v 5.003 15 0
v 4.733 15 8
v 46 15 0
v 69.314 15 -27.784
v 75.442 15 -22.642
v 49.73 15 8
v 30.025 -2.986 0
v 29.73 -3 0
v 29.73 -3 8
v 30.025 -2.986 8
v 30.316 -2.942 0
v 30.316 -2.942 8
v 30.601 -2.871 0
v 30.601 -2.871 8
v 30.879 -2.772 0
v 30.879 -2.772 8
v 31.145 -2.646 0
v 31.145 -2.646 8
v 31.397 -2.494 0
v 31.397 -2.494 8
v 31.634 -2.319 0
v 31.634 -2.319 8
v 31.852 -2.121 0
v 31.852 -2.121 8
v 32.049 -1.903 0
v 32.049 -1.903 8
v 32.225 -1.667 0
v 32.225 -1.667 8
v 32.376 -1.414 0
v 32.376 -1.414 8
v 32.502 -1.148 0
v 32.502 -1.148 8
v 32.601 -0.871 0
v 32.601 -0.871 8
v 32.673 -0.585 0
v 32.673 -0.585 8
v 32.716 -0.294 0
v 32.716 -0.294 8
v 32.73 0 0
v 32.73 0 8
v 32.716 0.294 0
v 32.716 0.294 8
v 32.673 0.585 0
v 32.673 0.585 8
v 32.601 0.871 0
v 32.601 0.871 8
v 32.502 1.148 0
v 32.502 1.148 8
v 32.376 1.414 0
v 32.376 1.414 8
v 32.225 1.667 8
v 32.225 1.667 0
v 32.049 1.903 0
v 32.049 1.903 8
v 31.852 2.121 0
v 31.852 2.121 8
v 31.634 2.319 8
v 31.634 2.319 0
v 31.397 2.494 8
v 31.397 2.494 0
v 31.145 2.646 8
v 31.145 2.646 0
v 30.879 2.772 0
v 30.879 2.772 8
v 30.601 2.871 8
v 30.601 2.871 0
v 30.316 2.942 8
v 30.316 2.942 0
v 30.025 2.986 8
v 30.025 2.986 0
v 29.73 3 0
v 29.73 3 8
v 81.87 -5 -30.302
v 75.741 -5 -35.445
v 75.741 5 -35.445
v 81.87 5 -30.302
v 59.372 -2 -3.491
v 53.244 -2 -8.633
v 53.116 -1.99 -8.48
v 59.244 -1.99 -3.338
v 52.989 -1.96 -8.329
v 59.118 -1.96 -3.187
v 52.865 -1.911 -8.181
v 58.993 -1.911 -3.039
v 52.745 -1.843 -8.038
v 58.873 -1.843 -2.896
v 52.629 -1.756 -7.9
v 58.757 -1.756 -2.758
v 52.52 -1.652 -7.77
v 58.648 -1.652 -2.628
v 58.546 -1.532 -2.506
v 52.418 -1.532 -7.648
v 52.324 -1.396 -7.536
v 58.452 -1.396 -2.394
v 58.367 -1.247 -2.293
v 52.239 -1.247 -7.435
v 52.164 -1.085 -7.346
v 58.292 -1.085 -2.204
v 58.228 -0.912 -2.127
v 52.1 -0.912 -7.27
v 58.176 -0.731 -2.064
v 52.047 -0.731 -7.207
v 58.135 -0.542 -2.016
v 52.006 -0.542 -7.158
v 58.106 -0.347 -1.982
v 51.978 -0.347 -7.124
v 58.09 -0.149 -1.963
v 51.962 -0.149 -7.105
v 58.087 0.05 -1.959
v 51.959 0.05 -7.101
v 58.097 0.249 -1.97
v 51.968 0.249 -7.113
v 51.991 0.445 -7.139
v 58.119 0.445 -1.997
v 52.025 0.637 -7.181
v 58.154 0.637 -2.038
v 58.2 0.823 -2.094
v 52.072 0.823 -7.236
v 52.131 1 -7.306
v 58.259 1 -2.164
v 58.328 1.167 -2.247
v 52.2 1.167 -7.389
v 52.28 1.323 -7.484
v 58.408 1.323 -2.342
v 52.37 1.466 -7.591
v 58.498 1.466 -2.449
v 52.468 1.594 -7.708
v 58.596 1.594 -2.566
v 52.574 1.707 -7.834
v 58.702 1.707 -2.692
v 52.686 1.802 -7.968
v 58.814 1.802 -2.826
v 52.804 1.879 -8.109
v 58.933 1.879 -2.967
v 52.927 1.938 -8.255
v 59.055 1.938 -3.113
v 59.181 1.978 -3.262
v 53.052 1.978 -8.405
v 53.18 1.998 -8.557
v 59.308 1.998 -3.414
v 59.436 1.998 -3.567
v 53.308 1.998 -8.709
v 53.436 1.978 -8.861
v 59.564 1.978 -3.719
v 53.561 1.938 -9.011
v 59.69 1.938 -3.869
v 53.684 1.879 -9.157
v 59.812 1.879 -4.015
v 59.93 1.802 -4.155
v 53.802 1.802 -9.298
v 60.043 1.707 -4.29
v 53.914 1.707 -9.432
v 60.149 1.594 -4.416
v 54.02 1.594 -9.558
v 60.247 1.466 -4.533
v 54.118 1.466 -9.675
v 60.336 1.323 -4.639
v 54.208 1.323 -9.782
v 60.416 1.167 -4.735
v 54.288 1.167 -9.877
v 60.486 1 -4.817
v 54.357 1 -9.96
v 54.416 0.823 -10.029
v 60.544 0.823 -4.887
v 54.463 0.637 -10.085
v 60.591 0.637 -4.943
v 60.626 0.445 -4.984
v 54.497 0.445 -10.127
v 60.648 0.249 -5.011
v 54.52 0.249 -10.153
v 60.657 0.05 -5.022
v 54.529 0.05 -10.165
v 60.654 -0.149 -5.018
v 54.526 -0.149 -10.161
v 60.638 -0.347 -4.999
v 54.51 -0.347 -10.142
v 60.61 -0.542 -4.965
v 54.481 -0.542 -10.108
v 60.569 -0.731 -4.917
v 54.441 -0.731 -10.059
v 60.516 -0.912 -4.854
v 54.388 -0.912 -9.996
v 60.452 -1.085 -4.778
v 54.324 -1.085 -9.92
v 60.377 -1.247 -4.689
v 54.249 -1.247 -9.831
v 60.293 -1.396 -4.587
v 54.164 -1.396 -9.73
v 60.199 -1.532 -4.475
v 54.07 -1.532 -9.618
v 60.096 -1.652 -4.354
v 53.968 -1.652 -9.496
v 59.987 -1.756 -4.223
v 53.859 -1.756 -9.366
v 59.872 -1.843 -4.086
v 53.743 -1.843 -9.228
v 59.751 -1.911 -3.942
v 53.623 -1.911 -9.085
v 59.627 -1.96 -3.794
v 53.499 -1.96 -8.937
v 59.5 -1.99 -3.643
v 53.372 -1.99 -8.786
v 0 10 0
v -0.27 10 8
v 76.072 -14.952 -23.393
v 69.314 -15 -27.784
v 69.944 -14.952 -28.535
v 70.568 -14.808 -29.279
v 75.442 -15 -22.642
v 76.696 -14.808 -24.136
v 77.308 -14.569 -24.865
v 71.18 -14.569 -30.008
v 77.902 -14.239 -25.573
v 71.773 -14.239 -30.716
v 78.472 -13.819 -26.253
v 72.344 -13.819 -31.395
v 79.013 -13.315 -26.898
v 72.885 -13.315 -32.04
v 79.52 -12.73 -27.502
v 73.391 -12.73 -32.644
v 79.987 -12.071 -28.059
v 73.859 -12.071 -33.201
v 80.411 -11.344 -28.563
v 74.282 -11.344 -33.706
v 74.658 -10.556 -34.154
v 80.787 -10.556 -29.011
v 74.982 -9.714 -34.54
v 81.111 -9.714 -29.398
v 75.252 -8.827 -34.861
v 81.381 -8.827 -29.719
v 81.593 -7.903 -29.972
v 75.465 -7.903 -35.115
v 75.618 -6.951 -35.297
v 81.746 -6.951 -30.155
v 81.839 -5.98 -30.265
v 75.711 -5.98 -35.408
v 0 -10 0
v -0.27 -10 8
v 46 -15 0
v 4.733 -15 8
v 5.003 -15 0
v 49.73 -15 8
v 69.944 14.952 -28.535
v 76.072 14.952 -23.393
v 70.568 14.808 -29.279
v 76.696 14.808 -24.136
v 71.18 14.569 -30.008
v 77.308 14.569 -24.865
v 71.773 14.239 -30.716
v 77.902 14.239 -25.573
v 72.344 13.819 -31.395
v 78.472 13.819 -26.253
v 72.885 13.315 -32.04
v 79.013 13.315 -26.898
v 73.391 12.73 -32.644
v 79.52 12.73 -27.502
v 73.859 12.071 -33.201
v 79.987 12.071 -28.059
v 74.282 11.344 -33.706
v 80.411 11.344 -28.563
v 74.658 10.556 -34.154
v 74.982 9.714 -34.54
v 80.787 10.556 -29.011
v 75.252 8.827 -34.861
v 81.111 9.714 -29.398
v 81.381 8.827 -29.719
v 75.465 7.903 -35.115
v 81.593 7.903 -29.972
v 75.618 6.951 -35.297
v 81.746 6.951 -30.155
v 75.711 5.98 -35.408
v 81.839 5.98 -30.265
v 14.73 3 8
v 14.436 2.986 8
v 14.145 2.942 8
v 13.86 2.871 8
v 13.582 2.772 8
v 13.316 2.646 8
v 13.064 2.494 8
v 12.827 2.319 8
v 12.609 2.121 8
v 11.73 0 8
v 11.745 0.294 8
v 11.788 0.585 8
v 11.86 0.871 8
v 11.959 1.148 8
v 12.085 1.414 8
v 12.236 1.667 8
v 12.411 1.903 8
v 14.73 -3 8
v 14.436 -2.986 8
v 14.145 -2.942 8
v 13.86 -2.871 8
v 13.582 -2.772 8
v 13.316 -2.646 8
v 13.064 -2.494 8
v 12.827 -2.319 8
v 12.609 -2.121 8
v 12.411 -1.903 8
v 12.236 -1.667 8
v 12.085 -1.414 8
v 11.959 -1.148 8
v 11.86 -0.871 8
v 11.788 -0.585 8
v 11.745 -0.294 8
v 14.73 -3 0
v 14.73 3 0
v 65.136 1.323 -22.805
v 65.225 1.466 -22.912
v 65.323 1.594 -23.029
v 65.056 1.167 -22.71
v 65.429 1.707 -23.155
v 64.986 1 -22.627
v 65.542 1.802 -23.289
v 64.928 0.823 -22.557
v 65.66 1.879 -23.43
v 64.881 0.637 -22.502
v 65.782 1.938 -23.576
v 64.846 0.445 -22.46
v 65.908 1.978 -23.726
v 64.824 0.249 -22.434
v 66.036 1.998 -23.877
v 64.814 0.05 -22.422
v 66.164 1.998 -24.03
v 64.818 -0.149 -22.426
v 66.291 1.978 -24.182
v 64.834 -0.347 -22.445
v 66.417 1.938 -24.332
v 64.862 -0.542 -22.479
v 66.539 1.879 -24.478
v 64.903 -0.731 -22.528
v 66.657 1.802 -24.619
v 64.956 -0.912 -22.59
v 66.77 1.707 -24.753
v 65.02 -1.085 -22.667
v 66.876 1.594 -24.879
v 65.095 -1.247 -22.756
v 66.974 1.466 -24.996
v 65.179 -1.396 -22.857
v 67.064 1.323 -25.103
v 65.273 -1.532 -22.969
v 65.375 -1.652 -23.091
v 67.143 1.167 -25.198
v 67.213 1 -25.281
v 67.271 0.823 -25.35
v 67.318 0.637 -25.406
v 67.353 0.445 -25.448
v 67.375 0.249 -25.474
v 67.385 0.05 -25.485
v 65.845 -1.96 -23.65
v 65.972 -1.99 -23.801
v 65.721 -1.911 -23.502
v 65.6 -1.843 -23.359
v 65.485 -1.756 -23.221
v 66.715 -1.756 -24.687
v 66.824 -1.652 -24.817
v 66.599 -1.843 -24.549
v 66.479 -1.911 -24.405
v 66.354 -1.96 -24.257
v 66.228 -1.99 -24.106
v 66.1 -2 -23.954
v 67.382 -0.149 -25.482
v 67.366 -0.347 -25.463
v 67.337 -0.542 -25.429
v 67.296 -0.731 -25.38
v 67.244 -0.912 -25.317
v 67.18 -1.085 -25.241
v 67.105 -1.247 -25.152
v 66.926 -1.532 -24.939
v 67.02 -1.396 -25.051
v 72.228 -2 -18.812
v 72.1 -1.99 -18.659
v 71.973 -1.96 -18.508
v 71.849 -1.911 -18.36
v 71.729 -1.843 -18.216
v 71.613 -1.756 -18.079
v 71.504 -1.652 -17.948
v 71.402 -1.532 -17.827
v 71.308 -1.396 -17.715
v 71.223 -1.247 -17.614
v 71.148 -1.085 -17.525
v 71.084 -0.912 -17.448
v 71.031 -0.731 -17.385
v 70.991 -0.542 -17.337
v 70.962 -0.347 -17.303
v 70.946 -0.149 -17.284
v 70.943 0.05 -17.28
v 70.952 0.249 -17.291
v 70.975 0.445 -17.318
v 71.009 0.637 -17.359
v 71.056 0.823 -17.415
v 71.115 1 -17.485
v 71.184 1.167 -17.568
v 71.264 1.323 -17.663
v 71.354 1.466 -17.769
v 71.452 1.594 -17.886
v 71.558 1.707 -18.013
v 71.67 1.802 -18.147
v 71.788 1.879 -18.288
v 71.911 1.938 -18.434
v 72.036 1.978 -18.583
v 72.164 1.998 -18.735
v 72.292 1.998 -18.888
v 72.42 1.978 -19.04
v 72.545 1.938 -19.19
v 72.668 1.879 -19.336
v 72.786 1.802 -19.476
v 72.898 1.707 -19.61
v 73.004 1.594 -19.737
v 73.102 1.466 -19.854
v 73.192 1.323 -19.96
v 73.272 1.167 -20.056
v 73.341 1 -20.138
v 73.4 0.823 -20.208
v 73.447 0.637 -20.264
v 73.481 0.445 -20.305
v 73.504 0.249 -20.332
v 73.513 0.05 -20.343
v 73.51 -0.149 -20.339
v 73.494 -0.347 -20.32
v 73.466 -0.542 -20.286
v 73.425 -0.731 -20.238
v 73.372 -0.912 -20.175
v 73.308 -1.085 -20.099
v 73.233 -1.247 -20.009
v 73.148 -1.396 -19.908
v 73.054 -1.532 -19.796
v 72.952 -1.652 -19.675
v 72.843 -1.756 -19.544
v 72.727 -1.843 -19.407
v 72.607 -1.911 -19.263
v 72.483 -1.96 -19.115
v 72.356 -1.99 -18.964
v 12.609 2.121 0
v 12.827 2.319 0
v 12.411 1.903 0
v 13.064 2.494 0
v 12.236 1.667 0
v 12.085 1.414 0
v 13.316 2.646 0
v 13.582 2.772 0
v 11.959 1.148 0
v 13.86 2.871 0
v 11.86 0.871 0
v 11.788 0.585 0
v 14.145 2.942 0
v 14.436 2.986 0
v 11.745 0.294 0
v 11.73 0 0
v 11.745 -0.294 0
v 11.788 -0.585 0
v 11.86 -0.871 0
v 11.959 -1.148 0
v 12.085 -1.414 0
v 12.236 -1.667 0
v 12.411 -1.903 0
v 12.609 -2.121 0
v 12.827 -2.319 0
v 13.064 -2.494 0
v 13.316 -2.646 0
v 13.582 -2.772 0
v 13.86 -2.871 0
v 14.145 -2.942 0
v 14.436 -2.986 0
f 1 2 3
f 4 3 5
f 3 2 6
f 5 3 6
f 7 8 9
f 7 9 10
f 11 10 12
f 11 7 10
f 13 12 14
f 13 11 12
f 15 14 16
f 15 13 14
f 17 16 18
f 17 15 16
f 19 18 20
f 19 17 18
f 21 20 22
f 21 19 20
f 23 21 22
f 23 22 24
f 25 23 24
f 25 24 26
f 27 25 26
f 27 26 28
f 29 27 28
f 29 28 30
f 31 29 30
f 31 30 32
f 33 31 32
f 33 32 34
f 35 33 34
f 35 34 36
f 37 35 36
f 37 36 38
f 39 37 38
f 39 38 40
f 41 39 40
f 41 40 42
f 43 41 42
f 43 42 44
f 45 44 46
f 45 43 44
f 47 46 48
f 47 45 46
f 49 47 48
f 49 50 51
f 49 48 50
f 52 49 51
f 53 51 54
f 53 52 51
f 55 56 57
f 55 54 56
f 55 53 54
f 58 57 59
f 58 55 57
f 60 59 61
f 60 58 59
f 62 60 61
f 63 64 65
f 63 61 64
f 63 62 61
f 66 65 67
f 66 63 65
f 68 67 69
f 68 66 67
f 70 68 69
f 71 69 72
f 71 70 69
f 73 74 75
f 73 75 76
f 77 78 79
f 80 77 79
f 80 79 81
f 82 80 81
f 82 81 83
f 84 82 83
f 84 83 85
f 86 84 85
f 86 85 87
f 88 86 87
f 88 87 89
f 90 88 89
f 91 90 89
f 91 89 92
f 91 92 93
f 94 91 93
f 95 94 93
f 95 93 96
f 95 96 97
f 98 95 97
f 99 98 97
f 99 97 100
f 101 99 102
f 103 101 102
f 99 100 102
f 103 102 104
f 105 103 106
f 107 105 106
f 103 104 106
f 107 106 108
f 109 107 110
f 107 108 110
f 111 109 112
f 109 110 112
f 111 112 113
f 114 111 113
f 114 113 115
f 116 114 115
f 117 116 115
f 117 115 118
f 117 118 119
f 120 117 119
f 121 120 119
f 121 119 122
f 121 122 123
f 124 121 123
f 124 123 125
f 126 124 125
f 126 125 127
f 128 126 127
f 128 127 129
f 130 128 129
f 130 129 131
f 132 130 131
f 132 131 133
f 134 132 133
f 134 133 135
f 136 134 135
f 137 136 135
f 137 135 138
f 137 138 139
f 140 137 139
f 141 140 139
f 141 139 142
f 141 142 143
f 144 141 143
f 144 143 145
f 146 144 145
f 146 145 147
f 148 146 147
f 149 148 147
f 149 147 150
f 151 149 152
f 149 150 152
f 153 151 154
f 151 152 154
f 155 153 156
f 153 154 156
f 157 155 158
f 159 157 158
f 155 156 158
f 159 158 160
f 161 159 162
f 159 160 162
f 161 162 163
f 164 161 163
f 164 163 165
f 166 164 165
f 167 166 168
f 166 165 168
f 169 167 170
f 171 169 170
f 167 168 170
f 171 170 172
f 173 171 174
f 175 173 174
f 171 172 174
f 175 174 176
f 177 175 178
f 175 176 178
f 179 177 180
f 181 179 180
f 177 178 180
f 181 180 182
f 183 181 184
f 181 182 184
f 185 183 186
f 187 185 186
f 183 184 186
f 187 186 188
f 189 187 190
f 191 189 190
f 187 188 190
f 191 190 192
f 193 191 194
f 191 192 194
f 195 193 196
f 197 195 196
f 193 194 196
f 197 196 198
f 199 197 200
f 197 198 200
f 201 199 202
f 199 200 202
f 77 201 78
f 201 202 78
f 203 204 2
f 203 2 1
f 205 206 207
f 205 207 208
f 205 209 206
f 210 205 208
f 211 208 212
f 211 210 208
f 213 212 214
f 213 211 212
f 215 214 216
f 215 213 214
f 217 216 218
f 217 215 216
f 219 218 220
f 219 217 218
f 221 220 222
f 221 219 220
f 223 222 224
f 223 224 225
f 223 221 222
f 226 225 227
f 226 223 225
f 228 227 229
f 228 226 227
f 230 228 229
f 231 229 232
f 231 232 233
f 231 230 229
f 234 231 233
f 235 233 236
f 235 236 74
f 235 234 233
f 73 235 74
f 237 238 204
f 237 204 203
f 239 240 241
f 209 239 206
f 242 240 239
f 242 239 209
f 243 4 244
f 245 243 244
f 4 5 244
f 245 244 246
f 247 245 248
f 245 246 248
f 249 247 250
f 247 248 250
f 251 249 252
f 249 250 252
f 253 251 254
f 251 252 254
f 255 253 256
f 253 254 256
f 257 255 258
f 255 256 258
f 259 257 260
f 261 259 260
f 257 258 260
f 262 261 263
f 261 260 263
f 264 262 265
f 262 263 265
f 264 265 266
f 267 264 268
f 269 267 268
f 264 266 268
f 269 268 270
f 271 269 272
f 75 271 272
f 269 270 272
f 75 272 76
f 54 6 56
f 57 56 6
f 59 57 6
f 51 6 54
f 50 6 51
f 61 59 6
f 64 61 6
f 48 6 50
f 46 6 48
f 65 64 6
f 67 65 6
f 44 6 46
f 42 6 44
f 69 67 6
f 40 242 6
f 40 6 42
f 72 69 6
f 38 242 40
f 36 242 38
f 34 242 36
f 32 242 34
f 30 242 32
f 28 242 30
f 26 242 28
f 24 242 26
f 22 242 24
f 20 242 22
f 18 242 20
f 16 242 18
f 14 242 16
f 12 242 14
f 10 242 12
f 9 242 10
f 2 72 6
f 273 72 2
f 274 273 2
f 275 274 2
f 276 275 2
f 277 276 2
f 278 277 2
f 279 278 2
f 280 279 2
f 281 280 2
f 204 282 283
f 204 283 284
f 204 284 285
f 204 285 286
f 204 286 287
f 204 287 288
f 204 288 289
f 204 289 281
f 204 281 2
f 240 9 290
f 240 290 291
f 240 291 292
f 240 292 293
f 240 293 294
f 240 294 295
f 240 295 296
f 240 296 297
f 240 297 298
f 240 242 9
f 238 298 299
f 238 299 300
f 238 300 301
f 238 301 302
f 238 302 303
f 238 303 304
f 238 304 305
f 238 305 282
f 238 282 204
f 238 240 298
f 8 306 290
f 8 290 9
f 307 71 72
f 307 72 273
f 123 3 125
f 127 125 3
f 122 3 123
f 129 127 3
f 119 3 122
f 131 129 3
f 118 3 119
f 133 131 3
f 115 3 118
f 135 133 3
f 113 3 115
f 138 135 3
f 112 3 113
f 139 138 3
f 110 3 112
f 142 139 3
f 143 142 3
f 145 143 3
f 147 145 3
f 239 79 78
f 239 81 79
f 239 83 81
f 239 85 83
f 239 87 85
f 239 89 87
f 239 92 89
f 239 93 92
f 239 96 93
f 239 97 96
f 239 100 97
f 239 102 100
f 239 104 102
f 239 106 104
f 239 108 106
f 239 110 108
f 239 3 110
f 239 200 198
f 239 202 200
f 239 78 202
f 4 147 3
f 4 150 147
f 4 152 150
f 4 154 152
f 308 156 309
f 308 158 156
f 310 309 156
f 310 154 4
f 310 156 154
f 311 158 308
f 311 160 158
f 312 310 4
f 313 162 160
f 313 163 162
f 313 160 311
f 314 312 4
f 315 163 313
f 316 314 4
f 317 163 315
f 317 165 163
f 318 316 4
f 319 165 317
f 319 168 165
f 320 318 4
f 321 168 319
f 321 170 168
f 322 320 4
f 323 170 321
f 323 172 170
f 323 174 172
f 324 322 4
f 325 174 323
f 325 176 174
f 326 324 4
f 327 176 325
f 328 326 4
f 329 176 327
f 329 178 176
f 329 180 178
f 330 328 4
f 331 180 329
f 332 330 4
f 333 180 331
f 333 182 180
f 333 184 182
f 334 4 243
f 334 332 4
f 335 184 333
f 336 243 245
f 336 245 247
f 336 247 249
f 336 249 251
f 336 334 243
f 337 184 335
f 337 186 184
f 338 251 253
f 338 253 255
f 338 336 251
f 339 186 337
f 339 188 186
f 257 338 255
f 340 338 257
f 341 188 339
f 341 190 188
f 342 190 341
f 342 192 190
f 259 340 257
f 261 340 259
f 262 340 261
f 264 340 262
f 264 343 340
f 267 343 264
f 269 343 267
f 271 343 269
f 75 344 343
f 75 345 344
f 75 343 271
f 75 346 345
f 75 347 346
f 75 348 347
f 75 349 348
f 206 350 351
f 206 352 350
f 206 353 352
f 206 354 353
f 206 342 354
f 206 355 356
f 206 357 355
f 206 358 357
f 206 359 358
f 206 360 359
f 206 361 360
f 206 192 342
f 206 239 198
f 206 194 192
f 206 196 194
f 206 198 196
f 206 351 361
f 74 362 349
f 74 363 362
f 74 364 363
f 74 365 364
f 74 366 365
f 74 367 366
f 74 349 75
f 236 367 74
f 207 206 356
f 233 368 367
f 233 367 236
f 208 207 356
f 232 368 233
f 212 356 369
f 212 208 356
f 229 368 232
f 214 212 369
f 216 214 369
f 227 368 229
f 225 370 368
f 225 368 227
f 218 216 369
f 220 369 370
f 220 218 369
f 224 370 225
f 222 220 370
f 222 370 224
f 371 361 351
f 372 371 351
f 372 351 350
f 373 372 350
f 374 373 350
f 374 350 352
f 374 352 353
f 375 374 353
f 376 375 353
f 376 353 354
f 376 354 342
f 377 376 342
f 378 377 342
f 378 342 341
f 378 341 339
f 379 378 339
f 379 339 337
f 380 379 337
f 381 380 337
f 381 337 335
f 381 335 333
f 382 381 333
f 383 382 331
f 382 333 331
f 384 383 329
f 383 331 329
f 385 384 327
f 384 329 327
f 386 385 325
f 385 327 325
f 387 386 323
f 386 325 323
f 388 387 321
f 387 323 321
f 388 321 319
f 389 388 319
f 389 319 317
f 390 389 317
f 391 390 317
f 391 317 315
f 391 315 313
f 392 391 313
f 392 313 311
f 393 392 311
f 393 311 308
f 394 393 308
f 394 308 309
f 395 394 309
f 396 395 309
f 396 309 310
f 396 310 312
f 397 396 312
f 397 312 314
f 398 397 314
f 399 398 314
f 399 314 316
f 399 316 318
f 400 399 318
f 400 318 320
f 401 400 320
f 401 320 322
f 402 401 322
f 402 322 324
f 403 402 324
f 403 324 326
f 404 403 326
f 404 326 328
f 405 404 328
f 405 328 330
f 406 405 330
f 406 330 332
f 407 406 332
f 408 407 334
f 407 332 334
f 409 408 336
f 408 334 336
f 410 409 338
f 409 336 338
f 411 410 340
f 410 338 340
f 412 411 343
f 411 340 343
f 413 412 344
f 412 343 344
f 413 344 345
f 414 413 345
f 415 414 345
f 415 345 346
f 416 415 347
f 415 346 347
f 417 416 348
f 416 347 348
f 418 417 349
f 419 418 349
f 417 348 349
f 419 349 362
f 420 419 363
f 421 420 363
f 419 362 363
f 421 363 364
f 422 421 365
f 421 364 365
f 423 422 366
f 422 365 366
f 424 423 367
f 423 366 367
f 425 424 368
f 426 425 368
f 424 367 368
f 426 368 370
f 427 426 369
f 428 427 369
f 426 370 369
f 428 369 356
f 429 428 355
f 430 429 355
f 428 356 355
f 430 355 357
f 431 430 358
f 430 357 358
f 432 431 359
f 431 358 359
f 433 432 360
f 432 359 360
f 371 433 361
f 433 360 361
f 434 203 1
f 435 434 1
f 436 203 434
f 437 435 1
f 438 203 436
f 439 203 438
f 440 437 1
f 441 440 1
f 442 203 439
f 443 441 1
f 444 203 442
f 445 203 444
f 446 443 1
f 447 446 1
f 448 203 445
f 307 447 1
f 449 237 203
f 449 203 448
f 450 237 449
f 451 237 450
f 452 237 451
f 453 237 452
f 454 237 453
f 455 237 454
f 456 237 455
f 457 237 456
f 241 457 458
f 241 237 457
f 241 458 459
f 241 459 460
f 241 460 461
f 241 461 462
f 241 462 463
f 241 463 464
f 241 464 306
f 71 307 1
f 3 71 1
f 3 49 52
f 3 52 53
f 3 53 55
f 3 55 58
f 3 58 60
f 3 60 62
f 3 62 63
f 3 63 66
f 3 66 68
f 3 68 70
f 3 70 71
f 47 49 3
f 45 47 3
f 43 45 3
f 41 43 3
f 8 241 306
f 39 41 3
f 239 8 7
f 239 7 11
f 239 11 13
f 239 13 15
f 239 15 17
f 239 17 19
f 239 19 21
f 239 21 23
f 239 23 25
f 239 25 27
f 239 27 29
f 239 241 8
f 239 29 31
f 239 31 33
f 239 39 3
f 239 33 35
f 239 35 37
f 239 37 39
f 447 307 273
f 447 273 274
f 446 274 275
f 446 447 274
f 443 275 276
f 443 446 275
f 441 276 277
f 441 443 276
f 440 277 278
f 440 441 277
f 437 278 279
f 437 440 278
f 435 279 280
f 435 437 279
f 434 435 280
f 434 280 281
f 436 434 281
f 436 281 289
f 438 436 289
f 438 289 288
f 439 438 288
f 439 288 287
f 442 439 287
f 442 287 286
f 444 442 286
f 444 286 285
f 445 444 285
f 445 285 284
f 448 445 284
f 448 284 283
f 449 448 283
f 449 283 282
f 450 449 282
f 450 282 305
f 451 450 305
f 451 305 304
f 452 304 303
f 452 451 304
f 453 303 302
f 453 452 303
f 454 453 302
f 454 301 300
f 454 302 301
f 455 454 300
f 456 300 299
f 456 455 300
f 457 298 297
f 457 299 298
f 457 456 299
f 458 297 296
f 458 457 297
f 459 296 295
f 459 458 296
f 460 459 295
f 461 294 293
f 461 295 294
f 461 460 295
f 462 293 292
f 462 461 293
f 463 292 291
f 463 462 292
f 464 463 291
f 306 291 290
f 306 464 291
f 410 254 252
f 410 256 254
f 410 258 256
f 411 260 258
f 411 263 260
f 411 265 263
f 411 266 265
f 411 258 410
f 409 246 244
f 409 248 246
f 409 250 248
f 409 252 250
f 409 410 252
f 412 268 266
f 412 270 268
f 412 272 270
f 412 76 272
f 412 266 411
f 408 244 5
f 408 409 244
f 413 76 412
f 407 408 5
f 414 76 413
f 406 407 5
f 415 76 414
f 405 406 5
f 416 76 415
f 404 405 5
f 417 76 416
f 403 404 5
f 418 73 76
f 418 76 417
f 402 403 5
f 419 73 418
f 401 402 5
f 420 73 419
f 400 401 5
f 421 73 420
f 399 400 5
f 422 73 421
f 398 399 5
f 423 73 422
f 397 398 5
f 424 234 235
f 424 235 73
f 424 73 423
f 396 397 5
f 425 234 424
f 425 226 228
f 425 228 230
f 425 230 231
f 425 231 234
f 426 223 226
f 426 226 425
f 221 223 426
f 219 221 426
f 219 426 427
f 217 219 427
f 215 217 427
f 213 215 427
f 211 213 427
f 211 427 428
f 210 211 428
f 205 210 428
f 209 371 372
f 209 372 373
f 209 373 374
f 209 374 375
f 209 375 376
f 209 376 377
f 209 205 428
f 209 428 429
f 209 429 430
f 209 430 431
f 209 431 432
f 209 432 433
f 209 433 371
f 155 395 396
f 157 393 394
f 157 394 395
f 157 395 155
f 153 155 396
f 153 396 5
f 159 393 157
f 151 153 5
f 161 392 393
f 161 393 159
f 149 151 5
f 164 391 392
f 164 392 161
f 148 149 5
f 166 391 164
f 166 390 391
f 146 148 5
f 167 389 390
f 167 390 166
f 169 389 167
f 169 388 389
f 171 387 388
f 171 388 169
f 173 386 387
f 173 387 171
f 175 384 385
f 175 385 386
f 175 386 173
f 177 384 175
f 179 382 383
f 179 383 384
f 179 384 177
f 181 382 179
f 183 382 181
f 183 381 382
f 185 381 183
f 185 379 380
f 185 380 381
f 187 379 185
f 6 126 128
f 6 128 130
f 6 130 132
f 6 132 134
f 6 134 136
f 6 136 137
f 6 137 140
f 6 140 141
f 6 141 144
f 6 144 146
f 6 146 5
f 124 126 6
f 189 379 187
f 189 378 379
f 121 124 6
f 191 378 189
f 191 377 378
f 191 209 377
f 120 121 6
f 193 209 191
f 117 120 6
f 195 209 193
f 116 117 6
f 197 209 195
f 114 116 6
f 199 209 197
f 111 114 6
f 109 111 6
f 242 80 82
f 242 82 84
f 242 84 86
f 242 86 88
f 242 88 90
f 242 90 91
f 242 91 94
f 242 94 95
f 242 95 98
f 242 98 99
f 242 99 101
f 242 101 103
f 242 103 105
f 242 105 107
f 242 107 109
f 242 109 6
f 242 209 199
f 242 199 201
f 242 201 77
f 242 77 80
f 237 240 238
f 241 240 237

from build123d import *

# Parameters (mm, degrees)
F1_DEPTH = 15
F3_DEPTH = 8.001
F5_D     = 4
F6_R     = 10
F7_SIZE  = 5


with BuildPart() as f1:
    # F0 (on Front) → F1 (new body, symmetric)
    with BuildSketch(Plane.XZ):
        Polygon((0, 0), (46, 0), (75.7414862046, -35.4445230334), (81.8698417496, -30.3022221559), (49.7304612652, 8), (-0.2695387348, 8), align=None)
    extrude(amount=F1_DEPTH, both=True)

    # F2 (on Top) → F3 (cut, through all)
    with BuildSketch(Plane.XY):
        with BuildLine():
            ThreePointArc((14.7304612652, 3), (11.7304612652, 0), (14.7304612652, -3))
            Line((14.7304612652, -3), (29.7304612652, -3))
            ThreePointArc((29.7304612652, -3), (32.7304612652, 0), (29.7304612652, 3))
            Line((29.7304612652, 3), (14.7304612652, 3))
        make_face()
    extrude(amount=F3_DEPTH, mode=Mode.SUBTRACT)

    # F5 (through all)
    with Locations(Plane(origin=(33.1222636313, 0, 27.7928791968), x_dir=(0, 1, 0), z_dir=(0.7660444431, 0, 0.6427876097))):
        with Locations((0, -40.8377687803), (0, -60.8377687803)):
            Hole(F5_D / 2)

    # F6
    f6_edges = [f1.edges().sort_by_distance(p)[0] for p in [
        (78.805664, -15, -32.873373),
        (78.805664, 15, -32.873373),
    ]]
    fillet(f6_edges, radius=F6_R)

    # F7
    f7_edges = [f1.edges().sort_by_distance(p)[0] for p in [
        (-0.134769, 15, 4),
        (-0.134769, -15, 4),
    ]]
    chamfer(f7_edges, length=F7_SIZE)


solid = f1.part
